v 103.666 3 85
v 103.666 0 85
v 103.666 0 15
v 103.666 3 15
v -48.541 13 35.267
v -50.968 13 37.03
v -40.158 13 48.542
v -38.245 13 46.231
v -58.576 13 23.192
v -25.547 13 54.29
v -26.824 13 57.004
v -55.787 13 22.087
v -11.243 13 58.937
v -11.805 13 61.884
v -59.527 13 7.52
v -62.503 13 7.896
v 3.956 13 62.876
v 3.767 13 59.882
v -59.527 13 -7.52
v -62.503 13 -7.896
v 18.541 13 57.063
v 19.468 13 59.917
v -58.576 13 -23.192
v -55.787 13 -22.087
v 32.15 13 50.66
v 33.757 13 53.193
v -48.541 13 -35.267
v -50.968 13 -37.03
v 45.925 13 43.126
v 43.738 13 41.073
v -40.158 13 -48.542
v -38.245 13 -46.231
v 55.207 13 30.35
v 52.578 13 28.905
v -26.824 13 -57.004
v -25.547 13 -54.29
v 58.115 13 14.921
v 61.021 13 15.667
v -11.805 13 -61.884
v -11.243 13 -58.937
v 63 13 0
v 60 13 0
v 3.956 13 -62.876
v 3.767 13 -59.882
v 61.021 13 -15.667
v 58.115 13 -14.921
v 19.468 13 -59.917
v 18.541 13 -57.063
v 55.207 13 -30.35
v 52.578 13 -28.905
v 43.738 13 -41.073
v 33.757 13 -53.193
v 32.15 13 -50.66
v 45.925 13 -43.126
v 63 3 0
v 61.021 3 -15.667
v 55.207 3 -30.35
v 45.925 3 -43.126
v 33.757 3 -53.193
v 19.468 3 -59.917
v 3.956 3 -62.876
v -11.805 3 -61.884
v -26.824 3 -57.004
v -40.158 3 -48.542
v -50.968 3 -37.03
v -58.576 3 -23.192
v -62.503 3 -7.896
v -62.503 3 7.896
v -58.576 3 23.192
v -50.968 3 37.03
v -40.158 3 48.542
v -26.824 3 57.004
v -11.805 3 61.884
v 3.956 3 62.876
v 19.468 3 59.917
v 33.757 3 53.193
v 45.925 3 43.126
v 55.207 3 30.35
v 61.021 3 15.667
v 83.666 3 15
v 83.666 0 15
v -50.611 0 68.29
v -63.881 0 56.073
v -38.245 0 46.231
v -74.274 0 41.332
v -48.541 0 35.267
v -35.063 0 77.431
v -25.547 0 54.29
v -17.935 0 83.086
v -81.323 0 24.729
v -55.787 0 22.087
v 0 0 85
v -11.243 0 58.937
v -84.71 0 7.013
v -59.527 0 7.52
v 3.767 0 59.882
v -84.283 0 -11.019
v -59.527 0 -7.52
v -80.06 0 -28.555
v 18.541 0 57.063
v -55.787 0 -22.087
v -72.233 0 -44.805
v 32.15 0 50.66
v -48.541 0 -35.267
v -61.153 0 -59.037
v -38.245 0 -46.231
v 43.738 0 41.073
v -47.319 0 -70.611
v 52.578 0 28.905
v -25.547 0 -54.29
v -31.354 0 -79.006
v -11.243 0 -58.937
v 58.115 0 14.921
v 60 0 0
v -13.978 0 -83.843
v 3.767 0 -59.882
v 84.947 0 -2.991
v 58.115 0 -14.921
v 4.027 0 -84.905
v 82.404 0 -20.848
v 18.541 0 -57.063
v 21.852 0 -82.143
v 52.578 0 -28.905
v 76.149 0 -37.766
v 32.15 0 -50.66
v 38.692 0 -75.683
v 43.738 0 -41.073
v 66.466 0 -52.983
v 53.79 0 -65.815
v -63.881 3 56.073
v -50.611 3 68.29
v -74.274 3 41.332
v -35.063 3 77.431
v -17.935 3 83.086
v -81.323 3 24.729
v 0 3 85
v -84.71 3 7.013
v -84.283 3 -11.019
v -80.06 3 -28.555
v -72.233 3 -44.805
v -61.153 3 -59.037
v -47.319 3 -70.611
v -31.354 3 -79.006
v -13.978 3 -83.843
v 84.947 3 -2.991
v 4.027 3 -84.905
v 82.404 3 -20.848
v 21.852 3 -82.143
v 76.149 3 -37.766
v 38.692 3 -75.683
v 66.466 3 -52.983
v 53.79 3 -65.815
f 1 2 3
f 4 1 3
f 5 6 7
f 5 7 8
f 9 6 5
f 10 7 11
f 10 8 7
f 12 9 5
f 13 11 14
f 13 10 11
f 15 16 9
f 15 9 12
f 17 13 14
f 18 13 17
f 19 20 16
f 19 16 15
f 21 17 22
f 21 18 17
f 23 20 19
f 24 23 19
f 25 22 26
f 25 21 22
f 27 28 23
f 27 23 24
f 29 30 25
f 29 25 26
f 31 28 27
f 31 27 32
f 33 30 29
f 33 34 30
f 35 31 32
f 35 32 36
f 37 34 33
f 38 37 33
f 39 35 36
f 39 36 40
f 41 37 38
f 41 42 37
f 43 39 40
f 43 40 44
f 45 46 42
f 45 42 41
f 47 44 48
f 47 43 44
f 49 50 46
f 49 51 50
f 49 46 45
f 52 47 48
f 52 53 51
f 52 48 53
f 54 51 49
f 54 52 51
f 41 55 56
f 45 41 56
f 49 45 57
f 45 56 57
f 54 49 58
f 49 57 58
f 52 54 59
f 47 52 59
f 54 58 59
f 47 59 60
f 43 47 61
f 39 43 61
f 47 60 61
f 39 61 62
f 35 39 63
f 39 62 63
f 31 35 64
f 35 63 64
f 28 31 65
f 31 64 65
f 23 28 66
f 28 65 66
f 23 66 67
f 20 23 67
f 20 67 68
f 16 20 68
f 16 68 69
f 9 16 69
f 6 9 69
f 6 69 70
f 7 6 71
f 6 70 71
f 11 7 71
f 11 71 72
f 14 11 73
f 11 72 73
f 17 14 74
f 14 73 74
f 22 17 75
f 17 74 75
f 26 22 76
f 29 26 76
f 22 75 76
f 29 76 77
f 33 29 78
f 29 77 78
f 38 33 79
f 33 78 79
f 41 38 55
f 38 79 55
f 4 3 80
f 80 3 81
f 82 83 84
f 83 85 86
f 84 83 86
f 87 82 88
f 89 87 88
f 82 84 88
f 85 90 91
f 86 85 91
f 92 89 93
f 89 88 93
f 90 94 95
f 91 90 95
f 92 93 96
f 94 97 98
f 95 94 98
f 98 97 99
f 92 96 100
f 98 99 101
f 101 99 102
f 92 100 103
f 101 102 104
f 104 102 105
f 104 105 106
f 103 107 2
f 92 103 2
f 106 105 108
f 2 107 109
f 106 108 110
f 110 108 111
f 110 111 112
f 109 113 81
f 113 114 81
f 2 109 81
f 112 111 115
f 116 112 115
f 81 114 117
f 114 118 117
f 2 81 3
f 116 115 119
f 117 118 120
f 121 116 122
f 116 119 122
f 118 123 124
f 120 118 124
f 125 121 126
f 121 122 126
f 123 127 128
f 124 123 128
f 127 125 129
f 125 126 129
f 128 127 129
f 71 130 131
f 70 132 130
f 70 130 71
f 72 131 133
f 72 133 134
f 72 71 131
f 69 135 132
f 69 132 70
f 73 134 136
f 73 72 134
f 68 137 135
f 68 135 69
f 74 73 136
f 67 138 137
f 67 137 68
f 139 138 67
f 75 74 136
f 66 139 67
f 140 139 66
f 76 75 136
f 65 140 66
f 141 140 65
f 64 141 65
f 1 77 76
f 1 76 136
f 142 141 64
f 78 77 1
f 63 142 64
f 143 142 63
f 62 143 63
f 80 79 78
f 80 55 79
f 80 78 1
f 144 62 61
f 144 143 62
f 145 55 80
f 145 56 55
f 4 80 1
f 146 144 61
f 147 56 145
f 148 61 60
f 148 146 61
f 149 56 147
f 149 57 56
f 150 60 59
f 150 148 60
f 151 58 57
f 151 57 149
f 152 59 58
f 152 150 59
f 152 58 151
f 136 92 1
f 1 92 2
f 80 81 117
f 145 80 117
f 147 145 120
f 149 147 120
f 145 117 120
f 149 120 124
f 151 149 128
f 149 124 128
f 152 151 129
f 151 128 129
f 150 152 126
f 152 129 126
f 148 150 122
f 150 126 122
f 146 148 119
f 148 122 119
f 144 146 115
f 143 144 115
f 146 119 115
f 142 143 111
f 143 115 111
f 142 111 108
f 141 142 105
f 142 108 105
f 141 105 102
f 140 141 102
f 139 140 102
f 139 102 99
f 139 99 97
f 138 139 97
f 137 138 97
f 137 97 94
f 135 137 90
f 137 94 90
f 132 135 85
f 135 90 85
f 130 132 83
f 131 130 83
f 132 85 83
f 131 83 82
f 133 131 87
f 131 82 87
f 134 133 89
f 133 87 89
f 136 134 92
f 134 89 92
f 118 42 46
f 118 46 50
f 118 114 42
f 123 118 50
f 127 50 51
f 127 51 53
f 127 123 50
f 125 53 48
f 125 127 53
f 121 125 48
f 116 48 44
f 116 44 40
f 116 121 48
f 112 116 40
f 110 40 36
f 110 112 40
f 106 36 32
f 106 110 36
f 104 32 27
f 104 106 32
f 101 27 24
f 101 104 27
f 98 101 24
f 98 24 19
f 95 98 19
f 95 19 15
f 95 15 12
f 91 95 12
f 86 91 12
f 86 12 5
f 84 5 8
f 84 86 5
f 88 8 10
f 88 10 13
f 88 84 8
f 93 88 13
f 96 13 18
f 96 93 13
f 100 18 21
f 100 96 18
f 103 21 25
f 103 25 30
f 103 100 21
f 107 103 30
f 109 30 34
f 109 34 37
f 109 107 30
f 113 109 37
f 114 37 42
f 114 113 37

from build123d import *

# Parameters (mm, degrees)
SKETCH2_R           = 60
BOSS_EXTRUDE1_DEPTH = 3
SKETCH3_R           = 63
SKETCH3_R_2         = 60
BOSS_EXTRUDE2_DEPTH = 10


with BuildPart() as part:
    # Sketch2 → Boss-Extrude1 (new body)
    with BuildSketch(Plane(origin=(0, 0, 0), x_dir=(1, 0, 0), z_dir=(0, 1, 0))):
        with BuildLine():
            Line((0, -85), (103.666002653, -85))
            Line((103.666002653, -85), (103.666002653, -15))
            Line((103.666002653, -15), (83.666002653, -15))
            ThreePointArc((83.666002653, -15), (-54.543560573, 65.192024052), (0, -85))
        make_face()
        Circle(SKETCH2_R, mode=Mode.SUBTRACT)
    extrude(amount=BOSS_EXTRUDE1_DEPTH)

    # Sketch3 → Boss-Extrude2 (add)
    with BuildSketch(Plane(origin=(0, 3, 0), x_dir=(1, 0, 0), z_dir=(0, 1, 0))):
        Circle(SKETCH3_R)
        Circle(SKETCH3_R_2, mode=Mode.SUBTRACT)
    extrude(amount=BOSS_EXTRUDE2_DEPTH)


solid = part.part
